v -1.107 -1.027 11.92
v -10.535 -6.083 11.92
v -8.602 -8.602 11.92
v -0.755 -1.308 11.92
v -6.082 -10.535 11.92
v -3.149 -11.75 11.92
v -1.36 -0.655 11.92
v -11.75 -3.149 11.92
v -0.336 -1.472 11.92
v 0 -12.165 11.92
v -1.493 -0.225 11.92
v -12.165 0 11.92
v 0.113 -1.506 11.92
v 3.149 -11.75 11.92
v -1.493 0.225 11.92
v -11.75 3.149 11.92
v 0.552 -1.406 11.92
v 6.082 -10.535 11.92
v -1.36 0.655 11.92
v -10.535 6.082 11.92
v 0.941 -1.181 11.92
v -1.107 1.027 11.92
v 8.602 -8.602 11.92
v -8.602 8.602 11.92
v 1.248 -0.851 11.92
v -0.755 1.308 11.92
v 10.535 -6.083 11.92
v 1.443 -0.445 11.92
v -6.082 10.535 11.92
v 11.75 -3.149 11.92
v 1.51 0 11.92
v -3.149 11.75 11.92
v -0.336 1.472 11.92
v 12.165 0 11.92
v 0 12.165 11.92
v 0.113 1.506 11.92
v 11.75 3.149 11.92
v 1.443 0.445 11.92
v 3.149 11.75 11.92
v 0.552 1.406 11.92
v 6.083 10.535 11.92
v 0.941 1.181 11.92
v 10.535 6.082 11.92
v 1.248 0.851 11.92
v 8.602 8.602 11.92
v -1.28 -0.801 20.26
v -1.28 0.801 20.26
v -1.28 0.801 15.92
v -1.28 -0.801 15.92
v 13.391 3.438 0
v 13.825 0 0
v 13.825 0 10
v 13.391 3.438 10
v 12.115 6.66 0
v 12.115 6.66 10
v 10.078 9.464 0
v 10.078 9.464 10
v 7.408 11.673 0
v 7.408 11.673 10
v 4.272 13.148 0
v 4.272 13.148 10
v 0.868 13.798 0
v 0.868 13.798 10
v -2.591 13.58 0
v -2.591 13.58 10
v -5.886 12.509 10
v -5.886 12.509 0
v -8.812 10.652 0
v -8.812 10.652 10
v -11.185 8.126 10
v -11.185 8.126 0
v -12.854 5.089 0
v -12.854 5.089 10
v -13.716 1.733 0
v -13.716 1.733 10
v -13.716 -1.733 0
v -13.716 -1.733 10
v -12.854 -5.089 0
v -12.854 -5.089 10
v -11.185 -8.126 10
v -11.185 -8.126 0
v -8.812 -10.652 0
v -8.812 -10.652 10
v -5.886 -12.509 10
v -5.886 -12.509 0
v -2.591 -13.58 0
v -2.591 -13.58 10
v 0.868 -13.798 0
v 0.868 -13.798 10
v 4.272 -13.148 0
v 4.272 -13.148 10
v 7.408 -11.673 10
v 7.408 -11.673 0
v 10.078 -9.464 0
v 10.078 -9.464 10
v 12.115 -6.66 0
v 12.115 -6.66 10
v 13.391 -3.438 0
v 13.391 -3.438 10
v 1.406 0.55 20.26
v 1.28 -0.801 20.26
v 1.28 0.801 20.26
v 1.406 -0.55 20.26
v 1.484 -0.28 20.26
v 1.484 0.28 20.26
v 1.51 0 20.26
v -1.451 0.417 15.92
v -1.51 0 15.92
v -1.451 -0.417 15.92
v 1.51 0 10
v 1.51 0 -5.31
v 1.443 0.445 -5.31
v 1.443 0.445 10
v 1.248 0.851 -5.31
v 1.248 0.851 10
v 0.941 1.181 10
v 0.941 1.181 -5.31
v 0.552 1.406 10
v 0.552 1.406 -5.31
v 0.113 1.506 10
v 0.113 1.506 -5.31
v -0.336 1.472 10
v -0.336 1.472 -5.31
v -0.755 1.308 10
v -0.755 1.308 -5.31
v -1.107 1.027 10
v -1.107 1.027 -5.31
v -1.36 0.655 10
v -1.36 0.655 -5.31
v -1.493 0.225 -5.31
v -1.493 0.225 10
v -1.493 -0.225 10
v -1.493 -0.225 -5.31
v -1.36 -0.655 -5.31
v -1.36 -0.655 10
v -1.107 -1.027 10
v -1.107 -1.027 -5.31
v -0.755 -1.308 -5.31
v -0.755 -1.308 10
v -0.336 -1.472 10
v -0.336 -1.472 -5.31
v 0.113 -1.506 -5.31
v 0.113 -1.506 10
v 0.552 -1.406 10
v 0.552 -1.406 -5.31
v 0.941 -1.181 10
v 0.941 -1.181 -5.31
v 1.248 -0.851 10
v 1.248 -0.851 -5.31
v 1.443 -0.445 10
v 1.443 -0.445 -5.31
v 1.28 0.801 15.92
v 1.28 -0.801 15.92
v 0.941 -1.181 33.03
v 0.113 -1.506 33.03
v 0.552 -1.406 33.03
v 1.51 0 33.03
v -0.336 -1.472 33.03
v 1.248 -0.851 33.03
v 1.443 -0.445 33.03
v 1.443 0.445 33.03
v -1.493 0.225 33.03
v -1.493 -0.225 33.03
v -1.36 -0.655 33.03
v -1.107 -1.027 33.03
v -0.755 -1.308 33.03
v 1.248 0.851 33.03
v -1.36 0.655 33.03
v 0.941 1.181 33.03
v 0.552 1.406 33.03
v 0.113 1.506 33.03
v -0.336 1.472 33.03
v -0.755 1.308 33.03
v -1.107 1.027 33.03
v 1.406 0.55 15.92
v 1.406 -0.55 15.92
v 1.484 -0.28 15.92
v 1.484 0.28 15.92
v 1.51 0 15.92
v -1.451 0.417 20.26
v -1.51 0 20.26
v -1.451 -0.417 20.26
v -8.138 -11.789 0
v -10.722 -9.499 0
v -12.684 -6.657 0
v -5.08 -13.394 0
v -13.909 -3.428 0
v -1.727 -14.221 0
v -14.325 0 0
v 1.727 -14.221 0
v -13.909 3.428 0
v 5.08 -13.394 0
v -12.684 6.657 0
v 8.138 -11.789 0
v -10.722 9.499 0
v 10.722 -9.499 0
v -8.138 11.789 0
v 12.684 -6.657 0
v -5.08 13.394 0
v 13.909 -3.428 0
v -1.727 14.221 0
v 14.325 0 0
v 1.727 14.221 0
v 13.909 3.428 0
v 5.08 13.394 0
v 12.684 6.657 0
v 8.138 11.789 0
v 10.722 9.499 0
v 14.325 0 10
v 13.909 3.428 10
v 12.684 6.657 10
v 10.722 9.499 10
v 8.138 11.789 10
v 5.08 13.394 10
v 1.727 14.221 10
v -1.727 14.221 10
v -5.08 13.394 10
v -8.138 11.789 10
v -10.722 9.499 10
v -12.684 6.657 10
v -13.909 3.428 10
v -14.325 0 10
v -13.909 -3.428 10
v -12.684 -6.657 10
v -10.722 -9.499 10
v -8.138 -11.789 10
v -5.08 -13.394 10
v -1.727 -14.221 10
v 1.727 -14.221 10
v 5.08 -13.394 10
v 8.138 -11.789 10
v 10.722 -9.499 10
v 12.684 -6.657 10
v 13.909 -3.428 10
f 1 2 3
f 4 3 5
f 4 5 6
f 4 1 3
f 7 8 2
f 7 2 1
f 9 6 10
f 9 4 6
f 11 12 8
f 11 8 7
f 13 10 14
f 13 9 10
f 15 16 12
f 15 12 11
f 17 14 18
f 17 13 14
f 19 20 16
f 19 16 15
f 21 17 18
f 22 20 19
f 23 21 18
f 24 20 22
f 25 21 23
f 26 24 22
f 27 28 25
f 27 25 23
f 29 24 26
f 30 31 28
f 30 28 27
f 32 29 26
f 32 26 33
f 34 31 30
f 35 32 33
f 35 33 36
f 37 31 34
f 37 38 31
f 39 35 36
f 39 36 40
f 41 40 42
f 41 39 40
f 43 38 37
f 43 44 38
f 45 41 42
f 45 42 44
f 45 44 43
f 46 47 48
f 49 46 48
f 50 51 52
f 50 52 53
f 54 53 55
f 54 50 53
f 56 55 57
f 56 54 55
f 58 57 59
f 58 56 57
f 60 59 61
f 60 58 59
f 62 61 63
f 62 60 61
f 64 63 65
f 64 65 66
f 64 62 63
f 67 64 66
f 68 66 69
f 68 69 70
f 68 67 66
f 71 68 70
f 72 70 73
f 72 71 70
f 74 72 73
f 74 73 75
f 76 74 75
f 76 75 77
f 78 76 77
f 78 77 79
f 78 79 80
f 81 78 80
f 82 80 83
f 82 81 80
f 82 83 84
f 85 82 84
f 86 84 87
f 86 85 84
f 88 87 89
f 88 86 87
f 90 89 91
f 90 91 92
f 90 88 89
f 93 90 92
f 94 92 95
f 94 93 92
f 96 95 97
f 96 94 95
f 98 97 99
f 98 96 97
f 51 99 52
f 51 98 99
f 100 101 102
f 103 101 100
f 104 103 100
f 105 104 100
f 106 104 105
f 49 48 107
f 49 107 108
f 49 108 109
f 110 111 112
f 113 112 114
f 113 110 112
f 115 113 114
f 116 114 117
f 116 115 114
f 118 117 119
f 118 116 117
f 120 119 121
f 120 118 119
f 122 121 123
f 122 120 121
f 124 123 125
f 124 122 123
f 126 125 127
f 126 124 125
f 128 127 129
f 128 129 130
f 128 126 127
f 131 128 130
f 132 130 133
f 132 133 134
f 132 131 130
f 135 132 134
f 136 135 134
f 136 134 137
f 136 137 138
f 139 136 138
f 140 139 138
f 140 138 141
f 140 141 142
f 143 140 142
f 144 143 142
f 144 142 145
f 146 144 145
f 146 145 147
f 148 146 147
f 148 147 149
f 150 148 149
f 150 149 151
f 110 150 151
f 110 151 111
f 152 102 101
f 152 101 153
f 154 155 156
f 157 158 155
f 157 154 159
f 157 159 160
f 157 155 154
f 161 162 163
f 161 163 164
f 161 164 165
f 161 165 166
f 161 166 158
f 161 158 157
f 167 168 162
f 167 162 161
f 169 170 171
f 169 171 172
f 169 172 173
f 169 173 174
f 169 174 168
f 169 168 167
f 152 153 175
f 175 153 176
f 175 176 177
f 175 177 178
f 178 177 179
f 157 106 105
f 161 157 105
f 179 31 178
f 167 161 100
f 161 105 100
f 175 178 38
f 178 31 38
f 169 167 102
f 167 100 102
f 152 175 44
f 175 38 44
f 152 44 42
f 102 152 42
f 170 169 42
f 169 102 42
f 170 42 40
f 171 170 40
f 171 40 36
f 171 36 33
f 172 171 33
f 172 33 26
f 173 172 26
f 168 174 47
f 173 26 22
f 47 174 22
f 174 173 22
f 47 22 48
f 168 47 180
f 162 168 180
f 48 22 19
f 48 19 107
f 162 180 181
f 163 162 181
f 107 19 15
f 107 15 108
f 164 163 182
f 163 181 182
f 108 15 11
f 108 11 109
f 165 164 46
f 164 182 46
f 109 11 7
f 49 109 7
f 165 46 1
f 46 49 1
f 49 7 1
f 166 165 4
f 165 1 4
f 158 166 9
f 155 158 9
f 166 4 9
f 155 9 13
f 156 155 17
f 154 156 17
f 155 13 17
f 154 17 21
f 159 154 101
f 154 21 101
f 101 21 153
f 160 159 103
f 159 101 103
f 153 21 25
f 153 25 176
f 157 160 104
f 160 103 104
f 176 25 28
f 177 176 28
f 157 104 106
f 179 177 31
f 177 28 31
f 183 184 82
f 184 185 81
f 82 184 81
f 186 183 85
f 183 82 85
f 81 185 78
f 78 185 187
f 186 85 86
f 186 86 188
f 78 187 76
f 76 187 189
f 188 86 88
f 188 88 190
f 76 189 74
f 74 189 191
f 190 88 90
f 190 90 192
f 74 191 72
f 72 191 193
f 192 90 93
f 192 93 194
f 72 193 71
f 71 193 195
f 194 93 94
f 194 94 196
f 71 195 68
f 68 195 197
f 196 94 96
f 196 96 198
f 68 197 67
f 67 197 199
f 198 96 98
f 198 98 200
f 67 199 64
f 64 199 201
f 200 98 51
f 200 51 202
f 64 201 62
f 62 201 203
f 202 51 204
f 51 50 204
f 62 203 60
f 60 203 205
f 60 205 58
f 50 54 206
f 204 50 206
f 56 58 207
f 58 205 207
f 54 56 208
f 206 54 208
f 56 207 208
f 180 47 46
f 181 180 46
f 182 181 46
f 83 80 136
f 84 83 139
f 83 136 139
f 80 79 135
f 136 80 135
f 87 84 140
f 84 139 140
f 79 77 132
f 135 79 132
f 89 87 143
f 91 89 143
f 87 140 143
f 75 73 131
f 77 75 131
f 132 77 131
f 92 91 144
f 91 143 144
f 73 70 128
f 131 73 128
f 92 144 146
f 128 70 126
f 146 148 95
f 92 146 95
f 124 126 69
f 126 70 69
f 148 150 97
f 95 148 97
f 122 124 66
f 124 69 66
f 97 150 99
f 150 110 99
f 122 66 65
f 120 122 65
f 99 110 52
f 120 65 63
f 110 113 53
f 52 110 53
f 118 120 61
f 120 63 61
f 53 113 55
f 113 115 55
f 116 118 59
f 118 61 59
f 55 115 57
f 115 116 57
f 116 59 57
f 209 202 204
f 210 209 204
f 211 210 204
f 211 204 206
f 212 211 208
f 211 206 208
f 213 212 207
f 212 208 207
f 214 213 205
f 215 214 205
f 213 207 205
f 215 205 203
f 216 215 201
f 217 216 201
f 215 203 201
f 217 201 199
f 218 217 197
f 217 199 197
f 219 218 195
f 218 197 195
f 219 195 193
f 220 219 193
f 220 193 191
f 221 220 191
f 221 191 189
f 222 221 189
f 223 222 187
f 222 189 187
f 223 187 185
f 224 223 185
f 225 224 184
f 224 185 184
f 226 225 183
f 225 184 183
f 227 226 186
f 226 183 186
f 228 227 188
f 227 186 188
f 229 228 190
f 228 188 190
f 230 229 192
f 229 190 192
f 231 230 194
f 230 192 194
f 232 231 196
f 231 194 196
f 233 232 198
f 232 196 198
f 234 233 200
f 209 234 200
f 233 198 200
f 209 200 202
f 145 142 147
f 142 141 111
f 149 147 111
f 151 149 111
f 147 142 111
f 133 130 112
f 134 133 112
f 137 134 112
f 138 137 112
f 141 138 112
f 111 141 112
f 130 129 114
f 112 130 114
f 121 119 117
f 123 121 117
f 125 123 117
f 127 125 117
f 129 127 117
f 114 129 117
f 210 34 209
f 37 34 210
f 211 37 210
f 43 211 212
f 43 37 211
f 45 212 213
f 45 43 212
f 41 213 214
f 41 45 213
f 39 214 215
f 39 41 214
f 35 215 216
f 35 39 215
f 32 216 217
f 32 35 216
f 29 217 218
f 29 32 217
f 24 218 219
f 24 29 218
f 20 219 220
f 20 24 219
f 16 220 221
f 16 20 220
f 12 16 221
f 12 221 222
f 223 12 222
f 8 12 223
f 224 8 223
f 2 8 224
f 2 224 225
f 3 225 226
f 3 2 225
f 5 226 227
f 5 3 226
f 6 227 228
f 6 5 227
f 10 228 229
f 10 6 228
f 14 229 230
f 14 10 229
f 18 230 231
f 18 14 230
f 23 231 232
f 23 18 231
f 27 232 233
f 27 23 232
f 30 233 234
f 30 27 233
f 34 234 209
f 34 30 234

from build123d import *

# Parameters (mm, degrees)
SKETCH1_R                = 14.325
SKETCH1_R_2              = 13.825
BOSS_EXTRUDE1_DEPTH      = 10
SKETCH2_R                = 14.325
SKETCH3_R                = 12.165
SKETCH5_R                = 1.51
BOSS_EXTRUDE3_DEPTH      = 21.11
BOSS_EXTRUDE3_DEPTH_BACK = 17.23
SKETCH6_W                = 1
SKETCH6_H                = 4.34
CUT_EXTRUDE1_DEPTH       = 15.3250001
CUT_EXTRUDE1_DEPTH_BACK  = 15.3250001


with BuildPart() as part:
    # Sketch1 → Boss-Extrude1 (new body)
    with BuildSketch(Plane.XY):
        Circle(SKETCH1_R)
        Circle(SKETCH1_R_2, mode=Mode.SUBTRACT)
    extrude(amount=BOSS_EXTRUDE1_DEPTH)

    # Sketch2 → Loft1 section 0
    with BuildSketch(Plane.XY.offset(10)):
        Circle(SKETCH2_R)
    # Sketch3 → Loft1 section 1
    with BuildSketch(Plane.XY.offset(11.92)):
        Circle(SKETCH3_R)
    loft()

    # Sketch5 → Boss-Extrude3 (add, two sides)
    with BuildSketch(Plane.XY.offset(11.92)) as boss_extrude3_sk:
        Circle(SKETCH5_R)
    extrude(amount=BOSS_EXTRUDE3_DEPTH)
    extrude(boss_extrude3_sk.sketch, amount=-BOSS_EXTRUDE3_DEPTH_BACK)

    # Sketch6 → Cut-Extrude1 (cut, two sides)
    with BuildSketch(Plane(origin=(0, 0, 0), x_dir=(1, 0, 0), z_dir=(0, 1, 0))) as cut_extrude1_sk:
        with Locations((-1.78, -18.09)):
            Rectangle(SKETCH6_W, SKETCH6_H)
        with Locations((1.78, -18.09)):
            Rectangle(SKETCH6_W, SKETCH6_H)
    extrude(amount=CUT_EXTRUDE1_DEPTH, mode=Mode.SUBTRACT)
    extrude(cut_extrude1_sk.sketch, amount=-CUT_EXTRUDE1_DEPTH_BACK, mode=Mode.SUBTRACT)


solid = part.part
